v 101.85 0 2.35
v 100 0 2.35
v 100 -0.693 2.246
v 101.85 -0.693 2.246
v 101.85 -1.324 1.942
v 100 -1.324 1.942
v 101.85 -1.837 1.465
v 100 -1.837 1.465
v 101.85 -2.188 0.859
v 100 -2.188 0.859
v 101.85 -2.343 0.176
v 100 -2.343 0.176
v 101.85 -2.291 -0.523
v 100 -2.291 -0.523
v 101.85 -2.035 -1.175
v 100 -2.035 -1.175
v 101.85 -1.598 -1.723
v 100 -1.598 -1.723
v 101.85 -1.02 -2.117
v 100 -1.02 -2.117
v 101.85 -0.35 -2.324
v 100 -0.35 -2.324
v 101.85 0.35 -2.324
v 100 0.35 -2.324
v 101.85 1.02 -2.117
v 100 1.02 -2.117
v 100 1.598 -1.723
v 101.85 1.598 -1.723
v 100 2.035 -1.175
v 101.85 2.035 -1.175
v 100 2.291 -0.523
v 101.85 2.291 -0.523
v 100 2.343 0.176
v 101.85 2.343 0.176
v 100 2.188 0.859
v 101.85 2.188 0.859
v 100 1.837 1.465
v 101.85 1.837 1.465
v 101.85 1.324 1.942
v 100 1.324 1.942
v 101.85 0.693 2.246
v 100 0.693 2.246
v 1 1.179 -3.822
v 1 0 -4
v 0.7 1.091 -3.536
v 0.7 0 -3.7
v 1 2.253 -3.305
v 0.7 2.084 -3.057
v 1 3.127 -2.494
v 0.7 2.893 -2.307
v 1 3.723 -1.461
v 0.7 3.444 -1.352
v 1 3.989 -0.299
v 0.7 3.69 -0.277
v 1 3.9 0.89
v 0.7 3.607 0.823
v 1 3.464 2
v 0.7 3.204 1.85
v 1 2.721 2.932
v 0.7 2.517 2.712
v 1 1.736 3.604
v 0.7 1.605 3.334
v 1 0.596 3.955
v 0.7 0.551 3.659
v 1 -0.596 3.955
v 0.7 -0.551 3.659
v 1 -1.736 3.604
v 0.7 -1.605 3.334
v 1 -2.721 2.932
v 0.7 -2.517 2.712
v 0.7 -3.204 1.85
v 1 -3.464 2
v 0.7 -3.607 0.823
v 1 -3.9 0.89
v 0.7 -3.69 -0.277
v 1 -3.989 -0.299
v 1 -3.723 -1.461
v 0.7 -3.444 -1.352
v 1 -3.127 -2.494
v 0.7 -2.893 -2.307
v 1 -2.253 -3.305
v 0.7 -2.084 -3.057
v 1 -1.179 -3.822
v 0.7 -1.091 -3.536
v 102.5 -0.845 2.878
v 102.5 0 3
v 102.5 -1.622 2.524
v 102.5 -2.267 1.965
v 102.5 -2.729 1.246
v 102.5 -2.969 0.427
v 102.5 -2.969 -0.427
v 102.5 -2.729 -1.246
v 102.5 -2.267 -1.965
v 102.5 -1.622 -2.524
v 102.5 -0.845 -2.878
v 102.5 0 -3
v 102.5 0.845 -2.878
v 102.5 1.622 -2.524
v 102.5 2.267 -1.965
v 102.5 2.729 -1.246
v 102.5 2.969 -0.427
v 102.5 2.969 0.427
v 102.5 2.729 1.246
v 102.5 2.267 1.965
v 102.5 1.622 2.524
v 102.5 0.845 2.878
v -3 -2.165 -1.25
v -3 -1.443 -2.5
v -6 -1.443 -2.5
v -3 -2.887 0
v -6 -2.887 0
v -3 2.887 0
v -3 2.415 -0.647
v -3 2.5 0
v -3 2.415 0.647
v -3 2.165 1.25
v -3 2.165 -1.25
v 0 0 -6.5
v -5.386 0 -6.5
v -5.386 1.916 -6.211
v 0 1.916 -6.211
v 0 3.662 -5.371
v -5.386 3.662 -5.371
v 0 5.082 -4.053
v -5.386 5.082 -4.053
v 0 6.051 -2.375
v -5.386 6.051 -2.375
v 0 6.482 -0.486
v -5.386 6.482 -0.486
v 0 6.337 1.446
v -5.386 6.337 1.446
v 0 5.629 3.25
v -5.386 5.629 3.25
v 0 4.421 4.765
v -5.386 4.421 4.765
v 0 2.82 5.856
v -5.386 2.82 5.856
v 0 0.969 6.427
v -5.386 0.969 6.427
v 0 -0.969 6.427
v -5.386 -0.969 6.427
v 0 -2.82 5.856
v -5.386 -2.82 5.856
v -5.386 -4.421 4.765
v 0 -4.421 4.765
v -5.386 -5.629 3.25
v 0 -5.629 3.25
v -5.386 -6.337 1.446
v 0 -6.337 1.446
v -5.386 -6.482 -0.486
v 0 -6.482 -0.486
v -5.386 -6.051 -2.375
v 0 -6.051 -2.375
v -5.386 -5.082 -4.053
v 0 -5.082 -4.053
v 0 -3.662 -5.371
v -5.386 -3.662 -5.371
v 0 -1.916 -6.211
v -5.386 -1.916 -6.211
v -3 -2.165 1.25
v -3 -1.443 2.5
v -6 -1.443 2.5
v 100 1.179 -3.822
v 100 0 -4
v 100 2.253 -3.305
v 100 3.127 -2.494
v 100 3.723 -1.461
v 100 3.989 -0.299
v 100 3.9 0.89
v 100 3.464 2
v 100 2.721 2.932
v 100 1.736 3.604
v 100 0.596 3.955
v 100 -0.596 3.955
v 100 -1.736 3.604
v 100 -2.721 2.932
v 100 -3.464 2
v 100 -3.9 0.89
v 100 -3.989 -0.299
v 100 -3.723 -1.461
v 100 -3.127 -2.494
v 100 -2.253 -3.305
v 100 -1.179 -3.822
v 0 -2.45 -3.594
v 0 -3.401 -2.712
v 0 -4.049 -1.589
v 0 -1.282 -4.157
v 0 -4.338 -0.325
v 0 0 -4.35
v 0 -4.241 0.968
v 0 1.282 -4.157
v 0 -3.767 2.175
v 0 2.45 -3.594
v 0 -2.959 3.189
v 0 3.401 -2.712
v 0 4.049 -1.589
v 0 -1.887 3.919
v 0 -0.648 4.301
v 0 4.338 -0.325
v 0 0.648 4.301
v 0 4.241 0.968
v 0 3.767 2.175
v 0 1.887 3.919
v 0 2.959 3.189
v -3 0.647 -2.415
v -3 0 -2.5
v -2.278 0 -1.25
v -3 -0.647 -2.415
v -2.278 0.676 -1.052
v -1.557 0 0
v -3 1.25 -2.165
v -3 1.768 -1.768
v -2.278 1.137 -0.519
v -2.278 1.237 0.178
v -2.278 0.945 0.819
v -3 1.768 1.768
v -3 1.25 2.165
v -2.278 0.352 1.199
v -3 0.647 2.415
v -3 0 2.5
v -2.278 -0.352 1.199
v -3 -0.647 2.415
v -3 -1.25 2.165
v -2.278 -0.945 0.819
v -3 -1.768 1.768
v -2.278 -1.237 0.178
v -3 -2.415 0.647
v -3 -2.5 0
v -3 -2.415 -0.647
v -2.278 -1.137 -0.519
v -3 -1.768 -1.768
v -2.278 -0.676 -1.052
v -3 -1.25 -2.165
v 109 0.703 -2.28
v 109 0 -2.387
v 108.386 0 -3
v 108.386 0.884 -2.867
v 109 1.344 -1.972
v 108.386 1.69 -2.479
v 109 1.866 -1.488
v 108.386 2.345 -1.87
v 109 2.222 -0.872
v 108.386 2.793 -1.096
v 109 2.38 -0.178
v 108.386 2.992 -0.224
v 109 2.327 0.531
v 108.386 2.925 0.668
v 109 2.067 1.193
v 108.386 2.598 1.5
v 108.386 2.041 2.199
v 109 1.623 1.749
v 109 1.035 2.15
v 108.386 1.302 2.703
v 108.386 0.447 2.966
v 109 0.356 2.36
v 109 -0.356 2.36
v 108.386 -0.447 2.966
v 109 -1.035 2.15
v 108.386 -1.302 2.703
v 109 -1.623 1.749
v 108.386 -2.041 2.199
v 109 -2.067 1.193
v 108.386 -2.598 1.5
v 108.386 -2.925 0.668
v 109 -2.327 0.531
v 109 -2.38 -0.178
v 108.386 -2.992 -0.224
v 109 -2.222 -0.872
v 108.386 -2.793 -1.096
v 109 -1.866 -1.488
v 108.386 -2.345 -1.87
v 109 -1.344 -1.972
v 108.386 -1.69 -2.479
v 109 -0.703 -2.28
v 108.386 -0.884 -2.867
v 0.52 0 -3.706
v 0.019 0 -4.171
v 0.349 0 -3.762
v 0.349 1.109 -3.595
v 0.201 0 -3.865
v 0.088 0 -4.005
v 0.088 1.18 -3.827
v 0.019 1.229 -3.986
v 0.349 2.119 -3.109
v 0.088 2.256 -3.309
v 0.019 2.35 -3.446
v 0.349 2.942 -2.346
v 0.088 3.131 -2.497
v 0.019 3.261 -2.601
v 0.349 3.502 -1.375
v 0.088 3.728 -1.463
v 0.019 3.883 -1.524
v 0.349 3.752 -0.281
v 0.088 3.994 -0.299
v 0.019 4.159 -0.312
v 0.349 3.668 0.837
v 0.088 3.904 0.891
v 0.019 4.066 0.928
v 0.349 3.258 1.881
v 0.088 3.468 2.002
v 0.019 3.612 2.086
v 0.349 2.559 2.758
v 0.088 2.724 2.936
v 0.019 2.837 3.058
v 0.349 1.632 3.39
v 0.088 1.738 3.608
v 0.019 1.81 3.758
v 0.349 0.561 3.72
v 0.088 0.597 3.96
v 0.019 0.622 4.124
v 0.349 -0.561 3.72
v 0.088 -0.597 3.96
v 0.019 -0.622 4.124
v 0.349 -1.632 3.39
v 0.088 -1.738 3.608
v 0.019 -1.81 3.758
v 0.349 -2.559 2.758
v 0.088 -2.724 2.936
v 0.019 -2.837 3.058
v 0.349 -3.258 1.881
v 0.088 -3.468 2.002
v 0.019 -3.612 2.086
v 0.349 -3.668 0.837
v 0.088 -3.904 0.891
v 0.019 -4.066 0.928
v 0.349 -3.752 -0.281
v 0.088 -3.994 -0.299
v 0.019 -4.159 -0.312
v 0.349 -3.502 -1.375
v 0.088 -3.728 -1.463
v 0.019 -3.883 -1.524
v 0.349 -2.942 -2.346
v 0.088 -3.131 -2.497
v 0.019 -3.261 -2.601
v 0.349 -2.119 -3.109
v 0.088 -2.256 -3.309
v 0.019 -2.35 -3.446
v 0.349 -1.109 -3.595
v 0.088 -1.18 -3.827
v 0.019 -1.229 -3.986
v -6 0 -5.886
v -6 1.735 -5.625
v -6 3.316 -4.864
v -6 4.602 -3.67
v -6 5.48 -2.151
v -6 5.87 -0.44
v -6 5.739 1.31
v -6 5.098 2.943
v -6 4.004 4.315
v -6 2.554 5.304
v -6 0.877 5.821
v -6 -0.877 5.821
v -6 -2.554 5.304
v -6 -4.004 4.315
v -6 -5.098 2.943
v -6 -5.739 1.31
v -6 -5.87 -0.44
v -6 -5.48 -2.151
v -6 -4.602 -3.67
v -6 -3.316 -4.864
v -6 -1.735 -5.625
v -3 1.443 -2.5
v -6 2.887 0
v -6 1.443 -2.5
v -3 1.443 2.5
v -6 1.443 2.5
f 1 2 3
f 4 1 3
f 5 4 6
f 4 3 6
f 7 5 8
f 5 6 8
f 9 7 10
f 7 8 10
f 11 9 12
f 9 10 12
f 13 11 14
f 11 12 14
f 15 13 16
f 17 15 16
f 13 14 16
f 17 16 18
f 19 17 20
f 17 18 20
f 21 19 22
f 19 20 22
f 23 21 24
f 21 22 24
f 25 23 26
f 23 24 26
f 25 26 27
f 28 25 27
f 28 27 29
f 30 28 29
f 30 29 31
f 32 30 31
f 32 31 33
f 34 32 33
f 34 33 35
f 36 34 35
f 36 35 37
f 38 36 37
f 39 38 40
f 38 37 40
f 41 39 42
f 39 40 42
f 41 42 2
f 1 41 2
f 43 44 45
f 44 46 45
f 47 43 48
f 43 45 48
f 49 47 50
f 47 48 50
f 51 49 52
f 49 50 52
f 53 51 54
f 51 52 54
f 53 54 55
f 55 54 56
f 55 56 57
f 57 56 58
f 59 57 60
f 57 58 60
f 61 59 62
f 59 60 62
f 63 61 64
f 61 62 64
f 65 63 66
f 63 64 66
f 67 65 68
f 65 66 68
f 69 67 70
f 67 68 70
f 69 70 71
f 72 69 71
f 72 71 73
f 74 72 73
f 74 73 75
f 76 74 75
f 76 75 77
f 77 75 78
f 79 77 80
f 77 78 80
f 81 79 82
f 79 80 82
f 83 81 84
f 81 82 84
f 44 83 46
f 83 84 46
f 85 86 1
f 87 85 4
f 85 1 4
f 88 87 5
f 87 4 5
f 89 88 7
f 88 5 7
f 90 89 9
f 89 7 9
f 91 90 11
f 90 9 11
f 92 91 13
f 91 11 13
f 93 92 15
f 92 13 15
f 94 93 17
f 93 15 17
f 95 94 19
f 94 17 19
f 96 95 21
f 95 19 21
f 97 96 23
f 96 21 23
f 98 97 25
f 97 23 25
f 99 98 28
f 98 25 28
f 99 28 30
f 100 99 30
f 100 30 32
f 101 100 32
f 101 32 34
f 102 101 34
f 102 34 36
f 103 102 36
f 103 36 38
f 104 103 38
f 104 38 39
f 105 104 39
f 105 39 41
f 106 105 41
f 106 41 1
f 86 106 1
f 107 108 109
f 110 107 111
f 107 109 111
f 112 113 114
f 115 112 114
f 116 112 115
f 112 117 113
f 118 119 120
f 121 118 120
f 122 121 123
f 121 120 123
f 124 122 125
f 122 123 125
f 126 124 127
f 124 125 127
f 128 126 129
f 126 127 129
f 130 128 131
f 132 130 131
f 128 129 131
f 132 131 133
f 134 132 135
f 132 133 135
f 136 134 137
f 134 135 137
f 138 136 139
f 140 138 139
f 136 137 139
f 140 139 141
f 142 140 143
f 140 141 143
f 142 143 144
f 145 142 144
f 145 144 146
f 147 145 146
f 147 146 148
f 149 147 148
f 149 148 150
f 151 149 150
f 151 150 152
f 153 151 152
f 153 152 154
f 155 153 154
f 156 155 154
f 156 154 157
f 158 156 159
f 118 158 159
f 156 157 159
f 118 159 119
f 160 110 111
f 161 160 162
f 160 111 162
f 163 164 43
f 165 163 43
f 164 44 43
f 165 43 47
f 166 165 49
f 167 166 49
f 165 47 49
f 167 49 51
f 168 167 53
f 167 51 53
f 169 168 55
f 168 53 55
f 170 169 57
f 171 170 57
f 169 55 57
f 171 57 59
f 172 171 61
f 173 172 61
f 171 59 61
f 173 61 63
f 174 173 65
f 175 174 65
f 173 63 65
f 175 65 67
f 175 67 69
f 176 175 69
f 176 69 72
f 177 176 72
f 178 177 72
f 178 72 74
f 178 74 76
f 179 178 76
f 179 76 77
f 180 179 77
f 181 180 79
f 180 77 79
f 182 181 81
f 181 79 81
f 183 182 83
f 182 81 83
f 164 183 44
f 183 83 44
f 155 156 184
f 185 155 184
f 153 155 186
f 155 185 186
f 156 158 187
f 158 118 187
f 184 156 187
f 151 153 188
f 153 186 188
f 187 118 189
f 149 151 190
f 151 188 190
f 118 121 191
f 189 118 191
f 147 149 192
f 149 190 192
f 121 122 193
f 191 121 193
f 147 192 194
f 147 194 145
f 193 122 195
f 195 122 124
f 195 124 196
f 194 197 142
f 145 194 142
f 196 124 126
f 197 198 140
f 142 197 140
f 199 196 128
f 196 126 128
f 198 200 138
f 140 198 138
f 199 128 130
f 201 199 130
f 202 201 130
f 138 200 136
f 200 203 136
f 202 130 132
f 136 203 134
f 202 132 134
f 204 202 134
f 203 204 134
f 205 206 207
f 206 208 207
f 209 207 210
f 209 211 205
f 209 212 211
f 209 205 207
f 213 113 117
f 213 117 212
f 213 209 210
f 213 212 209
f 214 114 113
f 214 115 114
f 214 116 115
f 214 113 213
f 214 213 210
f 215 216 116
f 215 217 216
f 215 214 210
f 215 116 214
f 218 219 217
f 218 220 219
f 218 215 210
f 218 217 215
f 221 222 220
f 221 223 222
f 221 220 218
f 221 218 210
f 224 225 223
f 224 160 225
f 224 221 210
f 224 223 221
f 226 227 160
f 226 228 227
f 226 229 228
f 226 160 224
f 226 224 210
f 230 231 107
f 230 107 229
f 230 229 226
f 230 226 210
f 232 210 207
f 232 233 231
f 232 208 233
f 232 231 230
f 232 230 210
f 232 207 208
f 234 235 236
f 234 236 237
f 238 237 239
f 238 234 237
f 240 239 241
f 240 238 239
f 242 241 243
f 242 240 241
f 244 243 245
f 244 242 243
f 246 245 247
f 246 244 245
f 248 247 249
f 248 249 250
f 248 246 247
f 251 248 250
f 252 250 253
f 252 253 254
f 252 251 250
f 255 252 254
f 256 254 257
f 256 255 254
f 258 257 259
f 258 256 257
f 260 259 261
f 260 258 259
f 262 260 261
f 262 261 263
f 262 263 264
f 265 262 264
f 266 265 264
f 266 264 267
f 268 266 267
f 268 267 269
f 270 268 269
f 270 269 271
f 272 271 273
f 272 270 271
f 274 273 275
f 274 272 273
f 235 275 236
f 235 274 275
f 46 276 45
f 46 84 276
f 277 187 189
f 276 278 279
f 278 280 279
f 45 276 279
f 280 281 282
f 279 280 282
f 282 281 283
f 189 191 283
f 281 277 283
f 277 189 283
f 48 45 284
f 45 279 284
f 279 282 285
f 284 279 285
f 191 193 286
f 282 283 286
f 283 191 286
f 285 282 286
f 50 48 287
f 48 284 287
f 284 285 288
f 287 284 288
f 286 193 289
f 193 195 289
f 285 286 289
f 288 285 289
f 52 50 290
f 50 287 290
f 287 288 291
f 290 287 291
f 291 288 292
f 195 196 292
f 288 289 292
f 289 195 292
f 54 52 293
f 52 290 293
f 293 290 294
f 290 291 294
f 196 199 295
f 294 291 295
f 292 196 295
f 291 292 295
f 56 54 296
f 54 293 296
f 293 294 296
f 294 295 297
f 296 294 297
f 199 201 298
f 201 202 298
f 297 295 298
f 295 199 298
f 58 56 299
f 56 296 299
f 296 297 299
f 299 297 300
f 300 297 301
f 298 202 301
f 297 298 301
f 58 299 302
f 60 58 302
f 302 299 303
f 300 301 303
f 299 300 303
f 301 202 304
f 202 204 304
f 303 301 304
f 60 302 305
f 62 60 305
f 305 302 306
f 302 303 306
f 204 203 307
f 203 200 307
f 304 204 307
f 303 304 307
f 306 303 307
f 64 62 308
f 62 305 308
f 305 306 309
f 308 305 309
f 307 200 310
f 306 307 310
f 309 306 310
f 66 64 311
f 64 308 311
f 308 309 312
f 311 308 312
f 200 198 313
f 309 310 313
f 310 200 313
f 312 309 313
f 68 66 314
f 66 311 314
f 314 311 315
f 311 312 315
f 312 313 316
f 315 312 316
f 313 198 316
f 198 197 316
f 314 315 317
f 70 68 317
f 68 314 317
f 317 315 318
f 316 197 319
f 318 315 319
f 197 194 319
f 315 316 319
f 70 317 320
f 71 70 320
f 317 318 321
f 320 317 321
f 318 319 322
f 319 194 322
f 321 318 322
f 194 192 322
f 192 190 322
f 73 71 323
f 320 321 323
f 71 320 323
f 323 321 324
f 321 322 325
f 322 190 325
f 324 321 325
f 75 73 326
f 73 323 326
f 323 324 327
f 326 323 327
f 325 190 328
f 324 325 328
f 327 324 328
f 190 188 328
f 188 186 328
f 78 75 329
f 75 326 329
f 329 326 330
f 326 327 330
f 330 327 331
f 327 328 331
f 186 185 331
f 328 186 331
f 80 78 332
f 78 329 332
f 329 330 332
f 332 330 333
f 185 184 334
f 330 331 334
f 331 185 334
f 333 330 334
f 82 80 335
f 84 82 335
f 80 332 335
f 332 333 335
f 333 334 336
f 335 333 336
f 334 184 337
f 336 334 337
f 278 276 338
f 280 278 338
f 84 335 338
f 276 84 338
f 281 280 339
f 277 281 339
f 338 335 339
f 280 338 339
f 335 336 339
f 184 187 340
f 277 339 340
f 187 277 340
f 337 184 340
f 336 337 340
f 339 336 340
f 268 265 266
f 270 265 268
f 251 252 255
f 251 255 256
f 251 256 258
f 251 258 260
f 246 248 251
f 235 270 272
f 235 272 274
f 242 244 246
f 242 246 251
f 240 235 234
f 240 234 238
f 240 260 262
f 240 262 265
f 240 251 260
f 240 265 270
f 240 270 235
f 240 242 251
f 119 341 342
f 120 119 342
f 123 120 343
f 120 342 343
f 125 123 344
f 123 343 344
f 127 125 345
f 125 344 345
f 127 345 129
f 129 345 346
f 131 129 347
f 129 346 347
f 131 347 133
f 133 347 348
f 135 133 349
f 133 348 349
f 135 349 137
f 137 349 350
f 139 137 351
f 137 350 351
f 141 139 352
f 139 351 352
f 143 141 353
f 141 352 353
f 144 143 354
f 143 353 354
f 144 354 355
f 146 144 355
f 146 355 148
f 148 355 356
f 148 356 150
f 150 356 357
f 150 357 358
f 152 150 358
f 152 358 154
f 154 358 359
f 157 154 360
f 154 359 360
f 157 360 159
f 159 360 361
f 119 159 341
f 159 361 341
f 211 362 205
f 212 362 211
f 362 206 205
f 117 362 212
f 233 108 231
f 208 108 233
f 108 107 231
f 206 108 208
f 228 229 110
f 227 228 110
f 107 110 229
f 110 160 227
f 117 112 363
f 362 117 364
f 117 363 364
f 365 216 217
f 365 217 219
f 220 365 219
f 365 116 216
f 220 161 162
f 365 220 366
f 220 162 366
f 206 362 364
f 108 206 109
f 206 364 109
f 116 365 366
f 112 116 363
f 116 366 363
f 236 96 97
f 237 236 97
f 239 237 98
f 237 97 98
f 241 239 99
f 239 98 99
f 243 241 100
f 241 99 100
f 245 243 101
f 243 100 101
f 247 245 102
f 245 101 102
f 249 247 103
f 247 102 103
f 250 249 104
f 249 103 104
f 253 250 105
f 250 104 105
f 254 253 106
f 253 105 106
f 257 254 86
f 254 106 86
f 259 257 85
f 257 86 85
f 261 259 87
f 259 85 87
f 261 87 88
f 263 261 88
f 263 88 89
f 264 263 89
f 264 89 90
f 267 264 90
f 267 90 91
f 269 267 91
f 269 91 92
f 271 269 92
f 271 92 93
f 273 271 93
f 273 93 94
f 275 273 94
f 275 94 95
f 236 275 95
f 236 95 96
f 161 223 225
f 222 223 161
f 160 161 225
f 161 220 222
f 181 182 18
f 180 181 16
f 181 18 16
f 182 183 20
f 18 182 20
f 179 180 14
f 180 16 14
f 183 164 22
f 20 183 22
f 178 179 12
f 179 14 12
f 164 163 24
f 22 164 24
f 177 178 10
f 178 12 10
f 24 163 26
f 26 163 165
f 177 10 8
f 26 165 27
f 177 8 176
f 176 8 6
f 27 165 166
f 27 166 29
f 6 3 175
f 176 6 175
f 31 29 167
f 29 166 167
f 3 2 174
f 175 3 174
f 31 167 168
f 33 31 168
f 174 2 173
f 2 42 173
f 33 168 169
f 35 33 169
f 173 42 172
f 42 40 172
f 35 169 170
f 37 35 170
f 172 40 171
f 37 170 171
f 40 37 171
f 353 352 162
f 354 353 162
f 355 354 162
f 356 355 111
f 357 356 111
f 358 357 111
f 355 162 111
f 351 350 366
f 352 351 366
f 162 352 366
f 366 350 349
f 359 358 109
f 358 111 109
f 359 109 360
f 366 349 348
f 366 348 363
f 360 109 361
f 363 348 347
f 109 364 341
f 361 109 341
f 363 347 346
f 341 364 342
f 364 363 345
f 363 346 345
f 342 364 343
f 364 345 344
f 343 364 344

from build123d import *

# Parameters (mm, degrees)
SKETCH2_R           = 2.35
BOSS_EXTRUDE1_DEPTH = 1.85
SKETCH3_R           = 2.35
BOSS_EXTRUDE2_DEPTH = 0.65
BOSS_EXTRUDE2_DRAFT = -45
SKETCH4_R           = 3
BOSS_EXTRUDE3_DEPTH = 6.5
CUT_EXTRUDE1_DEPTH  = 3
CHAMFER1_SIZE       = 0.6135


with BuildPart() as part:
    # Sketch1 → Revolve1 (revolve)
    with BuildSketch(Plane.XY, mode=Mode.PRIVATE) as revolve1_sk:
        with BuildLine():
            Line((-6, 6.5), (-6, 0))
            Line((-6, 0), (100, 0))
            Line((100, 0), (100, 4))
            Line((100, 4), (1, 4))
            Line((1, 4), (0.7, 3.7))
            ThreePointArc((0.7, 3.7), (0.201222236, 3.864777793), (0, 4.35))
            Line((0, 4.35), (0, 6.5))
            Line((0, 6.5), (-6, 6.5))
        make_face()
    revolve(revolve1_sk.sketch.rotate(Axis((-6, 0, 0), (1, 0, 0)), 270), axis=Axis((-6, 0, 0), (1, 0, 0)))

    # Sketch2 → Boss-Extrude1 (add)
    with BuildSketch(Plane(origin=(100, 0, 0), x_dir=(0, 0, -1), z_dir=(1, 0, 0))):
        with Locations(Location((0, 0, 0), (0, 0, 180))):
            Circle(SKETCH2_R)
    extrude(amount=BOSS_EXTRUDE1_DEPTH)


with BuildPart() as boss_extrude2_tool:
    # Sketch3 → Boss-Extrude2 (with draft: the straight prism first)
    with BuildSketch(Plane(origin=(101.85, 0, 0), x_dir=(0, 0, -1), z_dir=(1, 0, 0))):
        with Locations(Location((0, 0, 0), (0, 0, 180))):
            Circle(SKETCH3_R)
    extrude(amount=BOSS_EXTRUDE2_DEPTH)
    # Boss-Extrude2: the draft: its side faces are tilted about the plane it starts from
    boss_extrude2_sides = [boss_extrude2_tool.faces().sort_by_distance(p)[0] for p in [
        (102.175, 0, -2.35),
    ]]
    draft(boss_extrude2_sides, Plane(origin=(101.85, 0, 0), x_dir=(0, 0, -1), z_dir=(1, 0, 0)), BOSS_EXTRUDE2_DRAFT)


with BuildPart() as part_1:
    add(part.part)

    # Boss-Extrude2: add boss_extrude2_tool
    add(boss_extrude2_tool.part)

    # Sketch4 → Boss-Extrude3 (add)
    with BuildSketch(Plane(origin=(102.5, 0, 0), x_dir=(0, 0, -1), z_dir=(1, 0, 0))):
        Circle(SKETCH4_R)
    extrude(amount=BOSS_EXTRUDE3_DEPTH)

    # Sketch5 → Cut-Extrude1 (cut)
    with BuildSketch(Plane.ZY.offset(6)):
        Polygon((0, -2.886751346), (2.5, -1.443375673), (2.5, 1.443375673), (0, 2.886751346), (-2.5, 1.443375673), (-2.5, -1.443375673), align=None)
    extrude(amount=-CUT_EXTRUDE1_DEPTH, mode=Mode.SUBTRACT)

    # Sketch6 → Cut-Revolve1 (revolve, cut)
    with BuildSketch(Plane.XY, mode=Mode.PRIVATE) as cut_revolve1_sk:
        Polygon((-3, 2.5), (-3, 0), (-1.556624327, 0), align=None)
    revolve(cut_revolve1_sk.sketch.rotate(Axis((-3, 0, 0), (1, 0, 0)), 270), axis=Axis((-3, 0, 0), (1, 0, 0)), mode=Mode.SUBTRACT)

    # Chamfer1
    chamfer1_edges = [part_1.edges().sort_by_distance(p)[0] for p in [
        (109, 0, 3),
        (-6, 0, 6.5),
    ]]
    chamfer(chamfer1_edges, length=CHAMFER1_SIZE)


solid = part_1.part
